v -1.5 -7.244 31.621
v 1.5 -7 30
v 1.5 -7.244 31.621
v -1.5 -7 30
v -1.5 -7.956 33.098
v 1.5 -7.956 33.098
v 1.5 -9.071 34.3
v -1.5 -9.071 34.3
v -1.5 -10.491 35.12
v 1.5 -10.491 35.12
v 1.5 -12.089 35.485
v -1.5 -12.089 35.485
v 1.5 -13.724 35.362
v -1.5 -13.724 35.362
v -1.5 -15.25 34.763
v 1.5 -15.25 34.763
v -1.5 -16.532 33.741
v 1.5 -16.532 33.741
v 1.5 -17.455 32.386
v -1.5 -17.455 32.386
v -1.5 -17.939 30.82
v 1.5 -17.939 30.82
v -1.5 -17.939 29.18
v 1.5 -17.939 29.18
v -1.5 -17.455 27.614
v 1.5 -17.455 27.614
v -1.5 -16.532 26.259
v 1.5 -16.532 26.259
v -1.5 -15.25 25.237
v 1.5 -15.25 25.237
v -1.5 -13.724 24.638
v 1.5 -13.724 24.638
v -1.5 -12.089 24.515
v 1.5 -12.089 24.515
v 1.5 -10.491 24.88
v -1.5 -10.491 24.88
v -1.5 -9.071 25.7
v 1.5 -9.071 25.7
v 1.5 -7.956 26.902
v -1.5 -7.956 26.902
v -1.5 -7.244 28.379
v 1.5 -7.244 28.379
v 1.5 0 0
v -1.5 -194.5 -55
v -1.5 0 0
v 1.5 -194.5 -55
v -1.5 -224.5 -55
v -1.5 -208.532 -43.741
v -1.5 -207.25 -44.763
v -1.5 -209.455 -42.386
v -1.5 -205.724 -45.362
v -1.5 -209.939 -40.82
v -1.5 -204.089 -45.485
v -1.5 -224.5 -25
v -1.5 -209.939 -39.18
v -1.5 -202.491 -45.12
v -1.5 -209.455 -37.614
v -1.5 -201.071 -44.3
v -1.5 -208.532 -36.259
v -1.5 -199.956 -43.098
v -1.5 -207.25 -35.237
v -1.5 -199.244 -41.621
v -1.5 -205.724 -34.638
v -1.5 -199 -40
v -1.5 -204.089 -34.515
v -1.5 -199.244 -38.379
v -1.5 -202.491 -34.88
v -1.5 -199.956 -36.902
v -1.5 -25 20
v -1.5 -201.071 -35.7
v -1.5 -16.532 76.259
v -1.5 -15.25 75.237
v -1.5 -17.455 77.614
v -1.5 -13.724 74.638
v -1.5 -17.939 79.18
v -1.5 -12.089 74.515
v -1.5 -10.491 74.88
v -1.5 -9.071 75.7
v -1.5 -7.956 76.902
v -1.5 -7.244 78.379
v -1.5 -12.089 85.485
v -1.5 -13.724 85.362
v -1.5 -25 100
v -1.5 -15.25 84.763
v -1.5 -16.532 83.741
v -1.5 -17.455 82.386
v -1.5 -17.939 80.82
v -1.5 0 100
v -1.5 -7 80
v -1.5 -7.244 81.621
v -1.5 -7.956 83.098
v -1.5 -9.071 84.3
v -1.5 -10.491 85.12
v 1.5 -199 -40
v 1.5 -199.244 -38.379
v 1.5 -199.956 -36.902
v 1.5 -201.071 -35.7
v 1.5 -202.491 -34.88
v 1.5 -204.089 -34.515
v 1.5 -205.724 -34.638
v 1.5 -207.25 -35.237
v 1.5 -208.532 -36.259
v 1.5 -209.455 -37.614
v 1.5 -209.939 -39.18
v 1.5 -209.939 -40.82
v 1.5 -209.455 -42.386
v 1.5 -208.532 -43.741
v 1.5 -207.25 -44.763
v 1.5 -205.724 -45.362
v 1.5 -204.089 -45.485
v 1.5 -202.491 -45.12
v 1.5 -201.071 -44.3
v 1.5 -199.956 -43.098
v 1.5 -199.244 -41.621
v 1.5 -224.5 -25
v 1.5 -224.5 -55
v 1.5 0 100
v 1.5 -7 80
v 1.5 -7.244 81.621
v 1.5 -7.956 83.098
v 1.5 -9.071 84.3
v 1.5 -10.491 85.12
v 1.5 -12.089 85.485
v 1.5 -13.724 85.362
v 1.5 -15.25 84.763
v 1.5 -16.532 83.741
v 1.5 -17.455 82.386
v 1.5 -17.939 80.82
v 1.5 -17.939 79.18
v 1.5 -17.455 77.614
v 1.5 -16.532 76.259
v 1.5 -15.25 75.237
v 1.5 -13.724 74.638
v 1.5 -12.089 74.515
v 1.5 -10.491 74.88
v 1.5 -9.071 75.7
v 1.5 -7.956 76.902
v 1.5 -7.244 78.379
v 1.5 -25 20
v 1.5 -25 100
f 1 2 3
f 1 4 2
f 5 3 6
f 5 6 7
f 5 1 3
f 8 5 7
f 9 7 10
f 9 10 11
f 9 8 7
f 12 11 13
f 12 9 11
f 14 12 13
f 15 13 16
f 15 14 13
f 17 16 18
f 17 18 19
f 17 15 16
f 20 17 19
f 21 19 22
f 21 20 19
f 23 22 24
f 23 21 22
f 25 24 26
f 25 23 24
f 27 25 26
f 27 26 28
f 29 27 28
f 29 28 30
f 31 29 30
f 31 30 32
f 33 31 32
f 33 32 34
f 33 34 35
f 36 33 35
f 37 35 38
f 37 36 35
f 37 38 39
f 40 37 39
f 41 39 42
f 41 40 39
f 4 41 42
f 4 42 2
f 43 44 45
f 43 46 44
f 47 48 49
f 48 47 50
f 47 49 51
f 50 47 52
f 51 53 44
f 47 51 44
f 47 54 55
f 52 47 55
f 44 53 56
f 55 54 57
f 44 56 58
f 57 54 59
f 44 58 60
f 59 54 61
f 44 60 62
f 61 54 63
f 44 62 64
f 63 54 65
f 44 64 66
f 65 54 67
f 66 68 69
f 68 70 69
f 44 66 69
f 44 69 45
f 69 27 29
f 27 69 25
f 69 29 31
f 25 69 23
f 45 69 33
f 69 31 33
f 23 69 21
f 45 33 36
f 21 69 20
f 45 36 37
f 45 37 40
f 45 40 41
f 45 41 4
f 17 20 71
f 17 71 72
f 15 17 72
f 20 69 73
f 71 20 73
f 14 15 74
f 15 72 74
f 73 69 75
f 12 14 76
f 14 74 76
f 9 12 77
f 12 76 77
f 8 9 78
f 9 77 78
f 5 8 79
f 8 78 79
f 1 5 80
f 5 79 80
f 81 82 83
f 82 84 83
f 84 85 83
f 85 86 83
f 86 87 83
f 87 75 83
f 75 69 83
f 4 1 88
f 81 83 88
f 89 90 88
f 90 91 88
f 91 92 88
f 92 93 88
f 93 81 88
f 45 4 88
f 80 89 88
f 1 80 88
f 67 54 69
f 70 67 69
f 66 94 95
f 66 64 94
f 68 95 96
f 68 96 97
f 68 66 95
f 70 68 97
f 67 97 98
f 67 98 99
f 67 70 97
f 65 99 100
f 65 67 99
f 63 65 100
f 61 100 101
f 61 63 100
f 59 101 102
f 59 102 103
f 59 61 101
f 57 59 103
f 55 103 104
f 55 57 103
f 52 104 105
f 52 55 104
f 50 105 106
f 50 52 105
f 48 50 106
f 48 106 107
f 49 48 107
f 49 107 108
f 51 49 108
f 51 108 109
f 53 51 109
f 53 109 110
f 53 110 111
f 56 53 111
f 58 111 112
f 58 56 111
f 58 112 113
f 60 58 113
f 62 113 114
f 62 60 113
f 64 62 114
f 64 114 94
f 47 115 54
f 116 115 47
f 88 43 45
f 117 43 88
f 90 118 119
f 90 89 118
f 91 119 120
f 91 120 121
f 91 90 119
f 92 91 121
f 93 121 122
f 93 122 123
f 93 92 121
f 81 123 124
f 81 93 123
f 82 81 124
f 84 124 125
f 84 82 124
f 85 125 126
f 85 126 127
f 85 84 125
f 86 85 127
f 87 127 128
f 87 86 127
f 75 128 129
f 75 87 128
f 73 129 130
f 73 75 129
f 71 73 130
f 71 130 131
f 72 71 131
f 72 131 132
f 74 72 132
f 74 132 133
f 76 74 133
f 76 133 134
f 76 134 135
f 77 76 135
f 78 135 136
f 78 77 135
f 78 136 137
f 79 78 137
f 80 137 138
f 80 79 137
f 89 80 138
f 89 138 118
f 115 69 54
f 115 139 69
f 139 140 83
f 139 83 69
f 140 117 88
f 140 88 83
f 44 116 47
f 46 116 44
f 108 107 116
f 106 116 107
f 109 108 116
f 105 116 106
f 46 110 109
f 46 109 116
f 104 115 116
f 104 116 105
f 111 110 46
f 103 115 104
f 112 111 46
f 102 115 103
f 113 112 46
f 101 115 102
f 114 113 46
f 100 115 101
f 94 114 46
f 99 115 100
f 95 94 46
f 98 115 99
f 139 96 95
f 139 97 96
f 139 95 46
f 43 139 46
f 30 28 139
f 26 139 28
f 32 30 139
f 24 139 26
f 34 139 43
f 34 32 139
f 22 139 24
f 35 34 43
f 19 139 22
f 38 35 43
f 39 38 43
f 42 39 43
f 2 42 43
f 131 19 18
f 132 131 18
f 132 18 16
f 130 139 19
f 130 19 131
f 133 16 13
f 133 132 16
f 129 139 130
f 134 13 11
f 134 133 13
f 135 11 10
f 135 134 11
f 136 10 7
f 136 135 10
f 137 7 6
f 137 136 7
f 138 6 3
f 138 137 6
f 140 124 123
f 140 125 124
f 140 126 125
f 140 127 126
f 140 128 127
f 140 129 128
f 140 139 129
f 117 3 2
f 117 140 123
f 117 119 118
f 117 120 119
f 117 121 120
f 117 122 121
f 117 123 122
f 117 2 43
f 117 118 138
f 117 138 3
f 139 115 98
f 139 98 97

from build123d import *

# Parameters (mm, degrees)
F0_R     = 5.5
F1_DEPTH = 1.5


with BuildPart() as f1:
    # F0 (on Right) → F1 (new body, symmetric)
    with BuildSketch(Plane.YZ):
        Polygon((-194.5, -55), (0, 0), (0, 100), (-25, 100), (-25, 20), (-224.5, -25), (-224.5, -55), align=None)
        with Locations((-204.5, -40)):
            Circle(F0_R, mode=Mode.SUBTRACT)
        with Locations((-12.5, 30)):
            Circle(F0_R, mode=Mode.SUBTRACT)
        with Locations((-12.5, 80)):
            Circle(F0_R, mode=Mode.SUBTRACT)
    extrude(amount=F1_DEPTH, both=True)


solid = f1.part
